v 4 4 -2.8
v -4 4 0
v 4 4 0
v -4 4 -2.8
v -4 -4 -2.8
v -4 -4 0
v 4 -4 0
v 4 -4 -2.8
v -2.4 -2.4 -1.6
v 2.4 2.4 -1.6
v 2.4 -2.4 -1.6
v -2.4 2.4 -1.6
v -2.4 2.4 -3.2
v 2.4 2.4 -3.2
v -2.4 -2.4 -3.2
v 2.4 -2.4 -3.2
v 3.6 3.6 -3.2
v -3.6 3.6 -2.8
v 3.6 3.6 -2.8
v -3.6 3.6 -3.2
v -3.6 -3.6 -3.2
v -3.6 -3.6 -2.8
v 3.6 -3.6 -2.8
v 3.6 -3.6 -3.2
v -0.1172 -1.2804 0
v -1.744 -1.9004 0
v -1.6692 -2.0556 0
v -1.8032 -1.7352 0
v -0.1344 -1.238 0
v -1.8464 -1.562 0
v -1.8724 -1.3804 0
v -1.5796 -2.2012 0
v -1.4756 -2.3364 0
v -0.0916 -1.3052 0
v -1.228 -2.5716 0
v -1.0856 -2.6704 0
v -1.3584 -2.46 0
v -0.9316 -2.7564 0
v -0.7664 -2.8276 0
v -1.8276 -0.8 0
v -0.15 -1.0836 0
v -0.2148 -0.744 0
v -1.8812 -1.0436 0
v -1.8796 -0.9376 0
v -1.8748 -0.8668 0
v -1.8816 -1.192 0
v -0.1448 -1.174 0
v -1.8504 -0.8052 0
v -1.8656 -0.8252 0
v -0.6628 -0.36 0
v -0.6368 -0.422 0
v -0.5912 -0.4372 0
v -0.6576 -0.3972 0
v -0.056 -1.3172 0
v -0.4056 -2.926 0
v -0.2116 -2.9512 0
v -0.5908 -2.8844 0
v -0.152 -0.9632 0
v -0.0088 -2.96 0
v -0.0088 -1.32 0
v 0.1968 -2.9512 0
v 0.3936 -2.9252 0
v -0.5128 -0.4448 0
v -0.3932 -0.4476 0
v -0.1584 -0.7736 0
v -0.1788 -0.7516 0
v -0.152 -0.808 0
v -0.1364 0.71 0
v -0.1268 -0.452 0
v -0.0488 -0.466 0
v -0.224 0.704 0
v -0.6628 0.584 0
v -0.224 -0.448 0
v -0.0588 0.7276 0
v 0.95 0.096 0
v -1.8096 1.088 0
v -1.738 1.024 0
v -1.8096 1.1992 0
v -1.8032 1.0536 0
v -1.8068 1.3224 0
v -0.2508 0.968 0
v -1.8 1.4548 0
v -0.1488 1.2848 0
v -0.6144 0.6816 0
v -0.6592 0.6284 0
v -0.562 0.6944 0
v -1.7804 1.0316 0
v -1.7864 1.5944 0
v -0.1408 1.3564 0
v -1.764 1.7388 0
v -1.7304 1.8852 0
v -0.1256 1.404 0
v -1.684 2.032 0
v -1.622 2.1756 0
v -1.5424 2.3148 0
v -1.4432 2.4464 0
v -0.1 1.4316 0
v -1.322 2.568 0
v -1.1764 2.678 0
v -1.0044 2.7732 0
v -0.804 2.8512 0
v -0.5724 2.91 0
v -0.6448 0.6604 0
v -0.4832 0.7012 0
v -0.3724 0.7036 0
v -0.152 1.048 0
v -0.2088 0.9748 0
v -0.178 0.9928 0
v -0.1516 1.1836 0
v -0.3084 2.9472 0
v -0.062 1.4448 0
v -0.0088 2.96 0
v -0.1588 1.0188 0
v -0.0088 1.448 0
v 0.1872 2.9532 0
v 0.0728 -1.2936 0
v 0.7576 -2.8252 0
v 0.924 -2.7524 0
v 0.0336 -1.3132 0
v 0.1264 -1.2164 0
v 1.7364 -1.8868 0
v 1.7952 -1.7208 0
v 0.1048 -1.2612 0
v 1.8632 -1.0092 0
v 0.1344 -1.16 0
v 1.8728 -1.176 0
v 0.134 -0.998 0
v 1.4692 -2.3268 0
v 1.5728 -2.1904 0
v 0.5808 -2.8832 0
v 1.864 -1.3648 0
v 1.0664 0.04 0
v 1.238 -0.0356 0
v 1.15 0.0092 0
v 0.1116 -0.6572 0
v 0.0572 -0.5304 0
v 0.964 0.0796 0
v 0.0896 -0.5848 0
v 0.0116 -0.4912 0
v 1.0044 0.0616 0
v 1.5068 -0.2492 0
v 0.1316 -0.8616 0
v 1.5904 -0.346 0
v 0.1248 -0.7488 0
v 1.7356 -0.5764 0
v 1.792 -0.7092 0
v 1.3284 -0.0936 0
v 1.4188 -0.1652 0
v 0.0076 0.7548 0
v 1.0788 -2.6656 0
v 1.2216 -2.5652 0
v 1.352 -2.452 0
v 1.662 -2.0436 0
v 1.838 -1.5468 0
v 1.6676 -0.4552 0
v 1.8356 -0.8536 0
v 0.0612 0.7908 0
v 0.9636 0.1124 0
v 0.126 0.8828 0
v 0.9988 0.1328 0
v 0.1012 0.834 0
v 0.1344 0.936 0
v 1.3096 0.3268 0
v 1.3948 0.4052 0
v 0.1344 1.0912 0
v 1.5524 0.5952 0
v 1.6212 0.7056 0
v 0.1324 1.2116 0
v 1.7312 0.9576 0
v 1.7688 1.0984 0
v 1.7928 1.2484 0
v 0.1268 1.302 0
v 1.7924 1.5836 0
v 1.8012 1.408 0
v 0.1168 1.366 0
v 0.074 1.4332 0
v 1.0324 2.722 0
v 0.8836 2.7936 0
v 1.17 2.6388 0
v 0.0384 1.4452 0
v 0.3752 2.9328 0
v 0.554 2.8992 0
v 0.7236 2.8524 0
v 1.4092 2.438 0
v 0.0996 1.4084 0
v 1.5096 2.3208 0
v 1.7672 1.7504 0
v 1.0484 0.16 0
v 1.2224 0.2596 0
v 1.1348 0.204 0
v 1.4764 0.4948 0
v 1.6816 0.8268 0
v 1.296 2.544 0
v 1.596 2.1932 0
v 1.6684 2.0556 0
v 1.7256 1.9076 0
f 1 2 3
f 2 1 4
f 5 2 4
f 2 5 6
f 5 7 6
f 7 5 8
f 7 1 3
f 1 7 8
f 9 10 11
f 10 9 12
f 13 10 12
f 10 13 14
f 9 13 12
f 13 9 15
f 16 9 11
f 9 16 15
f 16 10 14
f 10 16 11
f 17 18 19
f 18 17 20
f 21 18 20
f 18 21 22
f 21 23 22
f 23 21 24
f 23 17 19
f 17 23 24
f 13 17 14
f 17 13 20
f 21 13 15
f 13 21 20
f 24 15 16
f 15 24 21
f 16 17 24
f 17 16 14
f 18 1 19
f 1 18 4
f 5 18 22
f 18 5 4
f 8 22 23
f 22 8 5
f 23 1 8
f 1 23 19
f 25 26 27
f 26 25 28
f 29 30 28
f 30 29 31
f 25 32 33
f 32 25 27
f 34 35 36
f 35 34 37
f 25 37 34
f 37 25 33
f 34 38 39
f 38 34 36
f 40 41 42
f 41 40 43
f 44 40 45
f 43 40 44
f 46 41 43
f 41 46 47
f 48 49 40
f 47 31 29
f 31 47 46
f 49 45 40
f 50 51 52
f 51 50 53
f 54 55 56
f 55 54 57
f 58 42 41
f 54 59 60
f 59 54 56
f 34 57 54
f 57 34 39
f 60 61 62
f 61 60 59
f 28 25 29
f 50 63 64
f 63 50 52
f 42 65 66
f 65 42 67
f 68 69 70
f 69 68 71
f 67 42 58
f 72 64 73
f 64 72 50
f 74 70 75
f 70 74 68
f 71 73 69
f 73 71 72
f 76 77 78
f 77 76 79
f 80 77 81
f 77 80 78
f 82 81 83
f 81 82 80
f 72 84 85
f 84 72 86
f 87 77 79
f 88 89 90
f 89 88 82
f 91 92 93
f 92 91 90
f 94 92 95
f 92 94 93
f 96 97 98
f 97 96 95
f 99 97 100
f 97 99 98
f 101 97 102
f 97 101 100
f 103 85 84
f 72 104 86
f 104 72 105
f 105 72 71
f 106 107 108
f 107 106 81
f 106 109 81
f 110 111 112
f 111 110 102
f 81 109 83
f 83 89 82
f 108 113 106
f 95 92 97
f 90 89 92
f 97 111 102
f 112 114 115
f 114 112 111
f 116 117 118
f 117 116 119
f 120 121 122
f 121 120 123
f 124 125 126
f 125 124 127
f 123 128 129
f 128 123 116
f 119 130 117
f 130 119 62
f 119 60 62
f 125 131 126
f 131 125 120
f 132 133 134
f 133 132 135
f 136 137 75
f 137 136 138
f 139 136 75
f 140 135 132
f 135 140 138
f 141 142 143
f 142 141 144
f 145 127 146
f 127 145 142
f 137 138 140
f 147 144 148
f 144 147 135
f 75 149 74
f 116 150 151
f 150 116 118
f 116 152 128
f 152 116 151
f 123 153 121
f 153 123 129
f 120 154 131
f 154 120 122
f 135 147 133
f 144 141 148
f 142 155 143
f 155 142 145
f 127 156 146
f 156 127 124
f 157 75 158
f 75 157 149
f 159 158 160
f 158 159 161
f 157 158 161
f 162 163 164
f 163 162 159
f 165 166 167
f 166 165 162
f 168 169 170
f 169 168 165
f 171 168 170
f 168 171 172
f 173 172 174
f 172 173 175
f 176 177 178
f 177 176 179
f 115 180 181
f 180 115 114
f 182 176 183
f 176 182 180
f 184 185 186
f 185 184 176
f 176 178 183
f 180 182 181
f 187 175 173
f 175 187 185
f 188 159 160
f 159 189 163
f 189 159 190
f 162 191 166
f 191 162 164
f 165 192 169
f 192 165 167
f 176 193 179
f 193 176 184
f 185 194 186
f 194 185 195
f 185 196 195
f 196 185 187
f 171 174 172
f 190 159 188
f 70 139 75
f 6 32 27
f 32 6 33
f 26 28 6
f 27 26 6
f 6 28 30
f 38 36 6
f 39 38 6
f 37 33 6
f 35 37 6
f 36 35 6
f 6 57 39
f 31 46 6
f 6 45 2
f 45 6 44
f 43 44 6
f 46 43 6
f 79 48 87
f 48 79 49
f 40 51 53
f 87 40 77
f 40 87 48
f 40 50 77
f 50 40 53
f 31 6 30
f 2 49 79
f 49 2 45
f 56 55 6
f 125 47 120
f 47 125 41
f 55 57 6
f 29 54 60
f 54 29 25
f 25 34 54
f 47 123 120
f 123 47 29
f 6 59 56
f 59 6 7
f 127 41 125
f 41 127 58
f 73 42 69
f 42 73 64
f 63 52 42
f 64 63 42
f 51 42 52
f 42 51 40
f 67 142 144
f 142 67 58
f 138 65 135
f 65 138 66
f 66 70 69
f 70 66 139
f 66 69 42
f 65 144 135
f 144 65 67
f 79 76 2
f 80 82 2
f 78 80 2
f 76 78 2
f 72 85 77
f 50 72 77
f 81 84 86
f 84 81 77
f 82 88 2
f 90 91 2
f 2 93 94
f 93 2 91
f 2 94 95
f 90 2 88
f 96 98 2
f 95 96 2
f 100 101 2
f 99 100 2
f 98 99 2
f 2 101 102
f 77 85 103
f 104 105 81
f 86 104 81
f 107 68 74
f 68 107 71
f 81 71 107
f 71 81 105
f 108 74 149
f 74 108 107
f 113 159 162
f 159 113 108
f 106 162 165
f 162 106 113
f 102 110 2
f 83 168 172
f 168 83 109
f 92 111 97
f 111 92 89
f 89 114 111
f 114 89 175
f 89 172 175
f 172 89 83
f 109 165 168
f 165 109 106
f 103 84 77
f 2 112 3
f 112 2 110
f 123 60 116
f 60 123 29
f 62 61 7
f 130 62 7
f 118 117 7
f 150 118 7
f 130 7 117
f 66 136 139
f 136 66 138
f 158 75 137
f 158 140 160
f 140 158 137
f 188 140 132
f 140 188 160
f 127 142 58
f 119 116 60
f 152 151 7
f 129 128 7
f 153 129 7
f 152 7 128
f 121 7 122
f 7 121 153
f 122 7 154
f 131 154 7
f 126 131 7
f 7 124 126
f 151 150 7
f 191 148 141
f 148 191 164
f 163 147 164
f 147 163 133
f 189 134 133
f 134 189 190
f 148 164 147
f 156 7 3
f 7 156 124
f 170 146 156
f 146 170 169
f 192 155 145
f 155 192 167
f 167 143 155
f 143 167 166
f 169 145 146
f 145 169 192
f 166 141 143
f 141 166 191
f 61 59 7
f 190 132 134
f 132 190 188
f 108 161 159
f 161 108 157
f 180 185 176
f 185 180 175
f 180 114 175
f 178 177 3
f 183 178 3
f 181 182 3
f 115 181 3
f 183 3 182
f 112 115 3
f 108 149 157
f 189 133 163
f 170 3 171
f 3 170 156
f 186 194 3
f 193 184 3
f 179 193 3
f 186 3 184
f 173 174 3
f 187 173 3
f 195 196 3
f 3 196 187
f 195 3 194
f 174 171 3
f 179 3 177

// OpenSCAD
// file: ../p/box5.scad
use <../lib.scad>
function ldraw_lib__box5() = [
// 0 Box with 5 Faces and All Edges
// 0 Name: box5.dat
// 0 Author: James Jessiman
// 0 !LDRAW_ORG Primitive UPDATE 2012-01
// 0 !LICENSE Licensed under CC BY 4.0 : see CAreadme.txt
// 
// 0 BFC CERTIFY CCW
  [0,"BFC","CERTIFY"],
  [0,"BFC","CCW"],
// 
// 0 !HISTORY 2002-04-03 [sbliss] Modified for BFC compliance
// 0 !HISTORY 2002-04-25 [PTadmin] Official Update 2002-02
// 0 !HISTORY 2007-06-24 [PTadmin] Header formatted for Contributor Agreement
// 0 !HISTORY 2008-07-01 [PTadmin] Official Update 2008-01
// 0 !HISTORY 2012-02-16 [Philo] Changed to CCW
// 0 !HISTORY 2012-03-30 [PTadmin] Official Update 2012-01
// 
// 
// 2 24 1 1 1 -1 1 1
  [2,24,1,1,1,-1,1,1],
// 2 24 -1 1 1 -1 1 -1
  [2,24,-1,1,1,-1,1,-1],
// 2 24 -1 1 -1 1 1 -1
  [2,24,-1,1,-1,1,1,-1],
// 2 24 1 1 -1 1 1 1
  [2,24,1,1,-1,1,1,1],
// 2 24 1 0 1 -1 0 1
  [2,24,1,0,1,-1,0,1],
// 2 24 -1 0 1 -1 0 -1
  [2,24,-1,0,1,-1,0,-1],
// 2 24 -1 0 -1 1 0 -1
  [2,24,-1,0,-1,1,0,-1],
// 2 24 1 0 -1 1 0 1
  [2,24,1,0,-1,1,0,1],
// 2 24 1 0 1 1 1 1
  [2,24,1,0,1,1,1,1],
// 2 24 -1 0 1 -1 1 1
  [2,24,-1,0,1,-1,1,1],
// 2 24 1 0 -1 1 1 -1
  [2,24,1,0,-1,1,1,-1],
// 2 24 -1 0 -1 -1 1 -1
  [2,24,-1,0,-1,-1,1,-1],
// 4 16 -1 1 1 1 1 1 1 1 -1 -1 1 -1
  [4,16,-1,1,1,1,1,1,1,1,-1,-1,1,-1],
// 4 16 -1 1 1 -1 0 1 1 0 1 1 1 1
  [4,16,-1,1,1,-1,0,1,1,0,1,1,1,1],
// 4 16 -1 1 -1 -1 0 -1 -1 0 1 -1 1 1
  [4,16,-1,1,-1,-1,0,-1,-1,0,1,-1,1,1],
// 4 16 1 1 -1 1 0 -1 -1 0 -1 -1 1 -1
  [4,16,1,1,-1,1,0,-1,-1,0,-1,-1,1,-1],
// 4 16 1 1 1 1 0 1 1 0 -1 1 1 -1
  [4,16,1,1,1,1,0,1,1,0,-1,1,1,-1],
];
module ldraw_lib__box5(step=0, col=false, unit=2/5, alt=false, line=0.2, solid=!$preview)
    makepoly(ldraw_lib__box5(), step=step, col=col, unit=unit, alt=alt, line=line, solid=solid);
ldraw_lib__box5(line=0.2);
// file: ../p/box4.scad
use <../lib.scad>
function ldraw_lib__box4() = [
// 0 Box with 4 Faces (2 Parallel Pairs) and All Edges
// 0 Name: box4.dat
// 0 Author: James Jessiman
// 0 !LDRAW_ORG Primitive UPDATE 2012-01
// 0 !LICENSE Licensed under CC BY 4.0 : see CAreadme.txt
// 
// 0 BFC CERTIFY CCW
  [0,"BFC","CERTIFY"],
  [0,"BFC","CCW"],
// 
// 0 !HISTORY 2002-04-03 [sbliss] Modified for BFC compliance
// 0 !HISTORY 2002-04-25 [PTadmin] Official Update 2002-02
// 0 !HISTORY 2007-06-24 [PTadmin] Header formatted for Contributor Agreement
// 0 !HISTORY 2008-07-01 [PTadmin] Official Update 2008-01
// 0 !HISTORY 2012-02-16 [Philo] Changed to CCW
// 0 !HISTORY 2012-03-30 [PTadmin] Official Update 2012-01
// 
// 
// 2 24 1 1 1 -1 1 1
  [2,24,1,1,1,-1,1,1],
// 2 24 -1 1 1 -1 1 -1
  [2,24,-1,1,1,-1,1,-1],
// 2 24 -1 1 -1 1 1 -1
  [2,24,-1,1,-1,1,1,-1],
// 2 24 1 1 -1 1 1 1
  [2,24,1,1,-1,1,1,1],
// 2 24 1 0 1 -1 0 1
  [2,24,1,0,1,-1,0,1],
// 2 24 -1 0 1 -1 0 -1
  [2,24,-1,0,1,-1,0,-1],
// 2 24 -1 0 -1 1 0 -1
  [2,24,-1,0,-1,1,0,-1],
// 2 24 1 0 -1 1 0 1
  [2,24,1,0,-1,1,0,1],
// 2 24 1 0 1 1 1 1
  [2,24,1,0,1,1,1,1],
// 2 24 -1 0 1 -1 1 1
  [2,24,-1,0,1,-1,1,1],
// 2 24 1 0 -1 1 1 -1
  [2,24,1,0,-1,1,1,-1],
// 2 24 -1 0 -1 -1 1 -1
  [2,24,-1,0,-1,-1,1,-1],
// 4 16 -1 1 1 -1 0 1 1 0 1 1 1 1
  [4,16,-1,1,1,-1,0,1,1,0,1,1,1,1],
// 4 16 -1 1 -1 -1 0 -1 -1 0 1 -1 1 1
  [4,16,-1,1,-1,-1,0,-1,-1,0,1,-1,1,1],
// 4 16 1 1 -1 1 0 -1 -1 0 -1 -1 1 -1
  [4,16,1,1,-1,1,0,-1,-1,0,-1,-1,1,-1],
// 4 16 1 1 1 1 0 1 1 0 -1 1 1 -1
  [4,16,1,1,1,1,0,1,1,0,-1,1,1,-1],
];
module ldraw_lib__box4(step=0, col=false, unit=2/5, alt=false, line=0.2, solid=!$preview)
    makepoly(ldraw_lib__box4(), step=step, col=col, unit=unit, alt=alt, line=line, solid=solid);
ldraw_lib__box4(line=0.2);
// file: s/3070bs01.scad
use <../../lib.scad>
use <../../p/box4.scad>
use <../../p/box5.scad>
function ldraw_lib__s__3070bs01() = [
// 0 ~Tile  1 x  1 with Groove without Top Face
// 0 Name: s\3070bs01.dat
// 0 Author: Chris Dee [cwdee]
// 0 !LDRAW_ORG Subpart UPDATE 2009-02
// 0 !LICENSE Licensed under CC BY 4.0 : see CAreadme.txt
// 
// 0 BFC CERTIFY CCW
  [0,"BFC","CERTIFY"],
  [0,"BFC","CCW"],
// 
// 0 !HISTORY 2009-09-03 [PTadmin] Official Update 2009-02
// 
// 
// 1 16 0 0 0 10 0 0 0 7 0 0 0 10 box4.dat
  [1,16,0,0,0,10,0,0,0,7,0,0,0,10, ldraw_lib__box4()],
// 0 BFC INVERTNEXT
  [0,"BFC","INVERTNEXT"],
// 1 16 0 8 0 6 0 0 0 -4 0 0 0 6 box5.dat
  [1,16,0,8,0,6,0,0,0,-4,0,0,0,6, ldraw_lib__box5()],
// 1 16 0 7 0 9 0 0 0 1 0 0 0 9 box4.dat
  [1,16,0,7,0,9,0,0,0,1,0,0,0,9, ldraw_lib__box4()],
// 
// 4 16 9 8 9 6 8 6 -6 8 6 -9 8 9
  [4,16,9,8,9,6,8,6,-6,8,6,-9,8,9],
// 4 16 -9 8 9 -6 8 6 -6 8 -6 -9 8 -9
  [4,16,-9,8,9,-6,8,6,-6,8,-6,-9,8,-9],
// 4 16 -9 8 -9 -6 8 -6 6 8 -6 9 8 -9
  [4,16,-9,8,-9,-6,8,-6,6,8,-6,9,8,-9],
// 4 16 9 8 -9 6 8 -6 6 8 6 9 8 9
  [4,16,9,8,-9,6,8,-6,6,8,6,9,8,9],
// 
// 4 16 10 7 10 9 7 9 -9 7 9 -10 7 10
  [4,16,10,7,10,9,7,9,-9,7,9,-10,7,10],
// 4 16 -10 7 10 -9 7 9 -9 7 -9 -10 7 -10
  [4,16,-10,7,10,-9,7,9,-9,7,-9,-10,7,-10],
// 4 16 -10 7 -10 -9 7 -9 9 7 -9 10 7 -10
  [4,16,-10,7,-10,-9,7,-9,9,7,-9,10,7,-10],
// 4 16 10 7 -10 9 7 -9 9 7 9 10 7 10
  [4,16,10,7,-10,9,7,-9,9,7,9,10,7,10],
// 0
];
module ldraw_lib__s__3070bs01(step=0, col=false, unit=2/5, alt=false, line=0.2, solid=!$preview)
    makepoly(ldraw_lib__s__3070bs01(), step=step, col=col, unit=unit, alt=alt, line=line, solid=solid);
ldraw_lib__s__3070bs01(line=0.2);
// main file
use <../lib.scad>
use <s/3070bs01.scad>
function ldraw_lib__3070bp08() = [
// 0 Tile  1 x  1 with Black Bold "3" Pattern
// 0 Name: 3070bp08.dat
// 0 Author: John Riley [jriley]
// 0 !LDRAW_ORG Part UPDATE 2009-03
// 0 !LICENSE Licensed under CC BY 4.0 : see CAreadme.txt
// 
// 0 BFC CERTIFY CCW
  [0,"BFC","CERTIFY"],
  [0,"BFC","CCW"],
// 
// 0 !KEYWORDS thick
// 
// 0 !HISTORY 2003-07-02 [Steffen] fixed BFC errors
// 0 !HISTORY 2004-09-15 [PTadmin] Official Update 2004-03
// 0 !HISTORY 2007-10-13 [PTadmin] Header formatted for Contributor Agreement
// 0 !HISTORY 2008-07-01 [PTadmin] Official Update 2008-01
// 0 !HISTORY 2009-08-12 [anathema] Corrected pattern
// 0 !HISTORY 2009-12-29 [PTadmin] Official Update 2009-03
// 
// 
// 1 16 0 0 0 1 0 0 0 1 0 0 0 1 s\3070bs01.dat
  [1,16,0,0,0,1,0,0,0,1,0,0,0,1, ldraw_lib__s__3070bs01()],
// 4 0 -4.36 0 -4.751 -4.173 0 -5.139 -0.293 0 -3.201 -4.508 0 -4.338
  [4,0,-4.36,0,-4.751,-4.173,0,-5.139,-0.293,0,-3.201,-4.508,0,-4.338],
// 4 0 -4.616 0 -3.905 -4.508 0 -4.338 -0.336 0 -3.095 -4.681 0 -3.451
  [4,0,-4.616,0,-3.905,-4.508,0,-4.338,-0.336,0,-3.095,-4.681,0,-3.451],
// 4 0 -0.293 0 -3.201 -4.173 0 -5.139 -3.949 0 -5.503 -3.689 0 -5.841
  [4,0,-0.293,0,-3.201,-4.173,0,-5.139,-3.949,0,-5.503,-3.689,0,-5.841],
// 4 0 -3.07 0 -6.429 -2.714 0 -6.676 -0.229 0 -3.263 -3.396 0 -6.15
  [4,0,-3.07,0,-6.429,-2.714,0,-6.676,-0.229,0,-3.263,-3.396,0,-6.15],
// 4 0 -3.689 0 -5.841 -3.396 0 -6.15 -0.229 0 -3.263 -0.293 0 -3.201
  [4,0,-3.689,0,-5.841,-3.396,0,-6.15,-0.229,0,-3.263,-0.293,0,-3.201],
// 4 0 -0.229 0 -3.263 -2.714 0 -6.676 -2.329 0 -6.891 -1.916 0 -7.069
  [4,0,-0.229,0,-3.263,-2.714,0,-6.676,-2.329,0,-6.891,-1.916,0,-7.069],
// 4 0 -0.375 0 -2.709 -0.537 0 -1.86 -4.569 0 -2 -4.703 0 -2.609
  [4,0,-0.375,0,-2.709,-0.537,0,-1.86,-4.569,0,-2,-4.703,0,-2.609],
// 3 0 -4.699 0 -2.344 -4.569 0 -2 -4.687 0 -2.167
  [3,0,-4.699,0,-2.344,-4.569,0,-2,-4.687,0,-2.167],
// 3 0 -4.703 0 -2.609 -4.569 0 -2 -4.699 0 -2.344
  [3,0,-4.703,0,-2.609,-4.569,0,-2,-4.699,0,-2.344],
// 4 0 -0.375 0 -2.709 -4.703 0 -2.609 -4.704 0 -2.98 -0.362 0 -2.935
  [4,0,-0.375,0,-2.709,-4.703,0,-2.609,-4.704,0,-2.98,-0.362,0,-2.935],
// 3 0 -4.626 0 -2.013 -4.664 0 -2.063 -4.569 0 -2
  [3,0,-4.626,0,-2.013,-4.664,0,-2.063,-4.569,0,-2],
// 4 0 -0.362 0 -2.935 -4.704 0 -2.98 -4.681 0 -3.451 -0.336 0 -3.095
  [4,0,-0.362,0,-2.935,-4.704,0,-2.98,-4.681,0,-3.451,-0.336,0,-3.095],
// 3 0 -4.664 0 -2.063 -4.687 0 -2.167 -4.569 0 -2
  [3,0,-4.664,0,-2.063,-4.687,0,-2.167,-4.569,0,-2],
// 4 0 -1.657 0 -0.9 -1.644 0 -0.993 -1.592 0 -1.055 -1.478 0 -1.093
  [4,0,-1.657,0,-0.9,-1.644,0,-0.993,-1.592,0,-1.055,-1.478,0,-1.093],
// 4 0 -0.14 0 -3.293 -1.477 0 -7.211 -1.014 0 -7.315 -0.529 0 -7.378
  [4,0,-0.14,0,-3.293,-1.477,0,-7.211,-1.014,0,-7.315,-0.529,0,-7.378],
// 3 0 -0.38 0 -2.408 -0.537 0 -1.86 -0.375 0 -2.709
  [3,0,-0.38,0,-2.408,-0.537,0,-1.86,-0.375,0,-2.709],
// 4 0 -0.022 0 -3.3 -0.14 0 -3.293 -0.529 0 -7.378 -0.022 0 -7.4
  [4,0,-0.022,0,-3.3,-0.14,0,-3.293,-0.529,0,-7.378,-0.022,0,-7.4],
// 4 0 -0.14 0 -3.293 -0.229 0 -3.263 -1.916 0 -7.069 -1.477 0 -7.211
  [4,0,-0.14,0,-3.293,-0.229,0,-3.263,-1.916,0,-7.069,-1.477,0,-7.211],
// 4 0 -0.022 0 -3.3 -0.022 0 -7.4 0.492 0 -7.378 0.984 0 -7.313
  [4,0,-0.022,0,-3.3,-0.022,0,-7.4,0.492,0,-7.378,0.984,0,-7.313],
// 3 0 -4.508 0 -4.338 -0.293 0 -3.201 -0.336 0 -3.095
  [3,0,-4.508,0,-4.338,-0.293,0,-3.201,-0.336,0,-3.095],
// 4 0 -1.657 0 -0.9 -1.478 0 -1.093 -1.282 0 -1.112 -0.983 0 -1.119
  [4,0,-1.657,0,-0.9,-1.478,0,-1.093,-1.282,0,-1.112,-0.983,0,-1.119],
// 4 0 -0.537 0 -1.86 -0.38 0 -2.02 -0.396 0 -1.934 -0.447 0 -1.879
  [4,0,-0.537,0,-1.86,-0.38,0,-2.02,-0.396,0,-1.934,-0.447,0,-1.879],
// 4 0 -0.317 0 -1.13 -0.122 0 -1.165 -0.341 0 1.775 -0.56 0 1.76
  [4,0,-0.317,0,-1.13,-0.122,0,-1.165,-0.341,0,1.775,-0.56,0,1.76],
// 3 0 -0.38 0 -2.02 -0.537 0 -1.86 -0.38 0 -2.408
  [3,0,-0.38,0,-2.02,-0.537,0,-1.86,-0.38,0,-2.408],
// 4 0 -0.983 0 -1.119 -0.56 0 -1.12 -1.657 0 1.46 -1.657 0 -0.9
  [4,0,-0.983,0,-1.119,-0.56,0,-1.12,-1.657,0,1.46,-1.657,0,-0.9],
// 4 0 -0.122 0 -1.165 2.375 0 0.24 -0.147 0 1.819 -0.341 0 1.775
  [4,0,-0.122,0,-1.165,2.375,0,0.24,-0.147,0,1.819,-0.341,0,1.775],
// 4 0 -0.56 0 -1.12 -0.317 0 -1.13 -0.56 0 1.76 -1.657 0 1.46
  [4,0,-0.56,0,-1.12,-0.317,0,-1.13,-0.56,0,1.76,-1.657,0,1.46],
// 4 0 -4.345 0 2.56 -4.524 0 2.998 -4.524 0 2.72 -4.508 0 2.634
  [4,0,-4.345,0,2.56,-4.524,0,2.998,-4.524,0,2.72,-4.508,0,2.634],
// 4 0 -4.517 0 3.306 -4.524 0 2.998 -4.345 0 2.56 -0.627 0 2.42
  [4,0,-4.517,0,3.306,-4.524,0,2.998,-4.345,0,2.56,-0.627,0,2.42],
// 4 0 -0.372 0 3.212 -4.5 0 3.637 -4.517 0 3.306 -0.627 0 2.42
  [4,0,-0.372,0,3.212,-4.5,0,3.637,-4.517,0,3.306,-0.627,0,2.42],
// 4 0 -1.648 0 1.571 -1.657 0 1.46 -1.405 0 1.736 -1.536 0 1.704
  [4,0,-1.648,0,1.571,-1.657,0,1.46,-1.405,0,1.736,-1.536,0,1.704],
// 3 0 -4.451 0 2.579 -4.345 0 2.56 -4.508 0 2.634
  [3,0,-4.451,0,2.579,-4.345,0,2.56,-4.508,0,2.634],
// 4 0 -4.466 0 3.986 -4.5 0 3.637 -0.352 0 3.391 -4.41 0 4.347
  [4,0,-4.466,0,3.986,-4.5,0,3.637,-0.352,0,3.391,-4.41,0,4.347],
// 4 0 -4.326 0 4.713 -4.41 0 4.347 -0.314 0 3.51 -4.21 0 5.08
  [4,0,-4.326,0,4.713,-4.41,0,4.347,-0.314,0,3.51,-4.21,0,5.08],
// 4 0 -4.055 0 5.439 -4.21 0 5.08 -0.314 0 3.51 -3.856 0 5.787
  [4,0,-4.055,0,5.439,-4.21,0,5.08,-0.314,0,3.51,-3.856,0,5.787],
// 4 0 -0.25 0 3.579 -3.305 0 6.42 -3.608 0 6.116 -3.856 0 5.787
  [4,0,-0.25,0,3.579,-3.305,0,6.42,-3.608,0,6.116,-3.856,0,5.787],
// 4 0 -2.941 0 6.695 -3.305 0 6.42 -0.25 0 3.579 -2.511 0 6.933
  [4,0,-2.941,0,6.695,-3.305,0,6.42,-0.25,0,3.579,-2.511,0,6.933],
// 4 0 -2.01 0 7.128 -2.511 0 6.933 -0.25 0 3.579 -1.431 0 7.275
  [4,0,-2.01,0,7.128,-2.511,0,6.933,-0.25,0,3.579,-1.431,0,7.275],
// 3 0 -1.612 0 1.651 -1.648 0 1.571 -1.536 0 1.704
  [3,0,-1.612,0,1.651,-1.648,0,1.571,-1.536,0,1.704],
// 4 0 -1.208 0 1.753 -1.405 0 1.736 -1.657 0 1.46 -0.931 0 1.759
  [4,0,-1.208,0,1.753,-1.405,0,1.736,-1.657,0,1.46,-0.931,0,1.759],
// 3 0 -0.931 0 1.759 -1.657 0 1.46 -0.56 0 1.76
  [3,0,-0.931,0,1.759,-1.657,0,1.46,-0.56,0,1.76],
// 4 0 -0.38 0 2.62 -0.627 0 2.42 -0.522 0 2.437 -0.445 0 2.482
  [4,0,-0.38,0,2.62,-0.627,0,2.42,-0.522,0,2.437,-0.445,0,2.482],
// 3 0 -0.38 0 2.62 -0.379 0 2.959 -0.627 0 2.42
  [3,0,-0.38,0,2.62,-0.379,0,2.959,-0.627,0,2.42],
// 4 0 -0.771 0 7.368 -1.431 0 7.275 -0.155 0 3.612 -0.022 0 7.4
  [4,0,-0.771,0,7.368,-1.431,0,7.275,-0.155,0,3.612,-0.022,0,7.4],
// 3 0 -0.627 0 2.42 -0.379 0 2.959 -0.372 0 3.212
  [3,0,-0.627,0,2.42,-0.379,0,2.959,-0.372,0,3.212],
// 3 0 -0.372 0 3.212 -0.352 0 3.391 -4.5 0 3.637
  [3,0,-0.372,0,3.212,-0.352,0,3.391,-4.5,0,3.637],
// 3 0 -0.445 0 2.482 -0.397 0 2.547 -0.38 0 2.62
  [3,0,-0.445,0,2.482,-0.397,0,2.547,-0.38,0,2.62],
// 3 0 -3.856 0 5.787 -0.314 0 3.51 -0.25 0 3.579
  [3,0,-3.856,0,5.787,-0.314,0,3.51,-0.25,0,3.579],
// 3 0 -4.41 0 4.347 -0.352 0 3.391 -0.314 0 3.51
  [3,0,-4.41,0,4.347,-0.352,0,3.391,-0.314,0,3.51],
// 3 0 -0.25 0 3.579 -0.155 0 3.612 -1.431 0 7.275
  [3,0,-0.25,0,3.579,-0.155,0,3.612,-1.431,0,7.275],
// 4 0 -0.022 0 7.4 -0.155 0 3.612 -0.022 0 3.62 0.468 0 7.383
  [4,0,-0.022,0,7.4,-0.155,0,3.612,-0.022,0,3.62,0.468,0,7.383],
// 4 0 2.31 0 -6.881 0.182 0 -3.234 0.084 0 -3.283 1.894 0 -7.063
  [4,0,2.31,0,-6.881,0.182,0,-3.234,0.084,0,-3.283,1.894,0,-7.063],
// 4 0 4.488 0 -4.302 0.316 0 -3.041 0.262 0 -3.153 4.341 0 -4.717
  [4,0,4.488,0,-4.302,0.316,0,-3.041,0.262,0,-3.153,4.341,0,-4.717],
// 4 0 4.658 0 -2.523 0.335 0 -2.495 0.336 0 -2.9 4.682 0 -2.94
  [4,0,4.658,0,-2.523,0.335,0,-2.495,0.336,0,-2.9,4.682,0,-2.94],
// 4 0 0.262 0 -3.153 0.182 0 -3.234 3.673 0 -5.817 3.932 0 -5.476
  [4,0,0.262,0,-3.153,0.182,0,-3.234,3.673,0,-5.817,3.932,0,-5.476],
// 4 0 0.084 0 -3.283 0.984 0 -7.313 1.452 0 -7.208 1.894 0 -7.063
  [4,0,0.084,0,-3.283,0.984,0,-7.313,1.452,0,-7.208,1.894,0,-7.063],
// 3 0 0.084 0 -3.283 -0.022 0 -3.3 0.984 0 -7.313
  [3,0,0.084,0,-3.283,-0.022,0,-3.3,0.984,0,-7.313],
// 4 0 0.336 0 -2.9 0.316 0 -3.041 4.66 0 -3.412 4.682 0 -2.94
  [4,0,0.336,0,-2.9,0.316,0,-3.041,4.66,0,-3.412,4.682,0,-2.94],
// 4 0 2.875 0 0.023 2.666 0 0.1 0.279 0 -1.643 3.095 0 -0.089
  [4,0,2.875,0,0.023,2.666,0,0.1,0.279,0,-1.643,3.095,0,-0.089],
// 4 0 0.143 0 -1.326 0.224 0 -1.462 2.41 0 0.199 2.375 0 0.24
  [4,0,0.143,0,-1.326,0.224,0,-1.462,2.41,0,0.199,2.375,0,0.24],
// 3 0 0.029 0 -1.228 0.143 0 -1.326 2.375 0 0.24
  [3,0,0.029,0,-1.228,0.143,0,-1.326,2.375,0,0.24],
// 4 0 2.511 0 0.154 0.224 0 -1.462 0.279 0 -1.643 2.666 0 0.1
  [4,0,2.511,0,0.154,0.224,0,-1.462,0.279,0,-1.643,2.666,0,0.1],
// 4 0 0.312 0 -1.872 0.329 0 -2.154 3.976 0 -0.865 3.767 0 -0.623
  [4,0,0.312,0,-1.872,0.329,0,-2.154,3.976,0,-0.865,3.767,0,-0.623],
// 4 0 0.329 0 -2.154 0.335 0 -2.495 4.48 0 -1.773 4.339 0 -1.441
  [4,0,0.329,0,-2.154,0.335,0,-2.495,4.48,0,-1.773,4.339,0,-1.441],
// 3 0 2.41 0 0.199 0.224 0 -1.462 2.511 0 0.154
  [3,0,2.41,0,0.199,0.224,0,-1.462,2.511,0,0.154],
// 4 0 3.321 0 -0.234 0.279 0 -1.643 0.312 0 -1.872 3.547 0 -0.413
  [4,0,3.321,0,-0.234,0.279,0,-1.643,0.312,0,-1.872,3.547,0,-0.413],
// 3 0 2.375 0 0.24 0.019 0 1.887 -0.147 0 1.819
  [3,0,2.375,0,0.24,0.019,0,1.887,-0.147,0,1.819],
// 4 0 0.182 0 -3.234 2.31 0 -6.881 2.697 0 -6.664 3.054 0 -6.413
  [4,0,0.182,0,-3.234,2.31,0,-6.881,2.697,0,-6.664,3.054,0,-6.413],
// 4 0 0.182 0 -3.234 3.054 0 -6.413 3.38 0 -6.13 3.673 0 -5.817
  [4,0,0.182,0,-3.234,3.054,0,-6.413,3.38,0,-6.13,3.673,0,-5.817],
// 4 0 0.262 0 -3.153 3.932 0 -5.476 4.155 0 -5.109 4.341 0 -4.717
  [4,0,0.262,0,-3.153,3.932,0,-5.476,4.155,0,-5.109,4.341,0,-4.717],
// 4 0 0.316 0 -3.041 4.488 0 -4.302 4.595 0 -3.867 4.66 0 -3.412
  [4,0,0.316,0,-3.041,4.488,0,-4.302,4.595,0,-3.867,4.66,0,-3.412],
// 3 0 0.279 0 -1.643 3.321 0 -0.234 3.095 0 -0.089
  [3,0,0.279,0,-1.643,3.321,0,-0.234,3.095,0,-0.089],
// 3 0 0.312 0 -1.872 3.767 0 -0.623 3.547 0 -0.413
  [3,0,0.312,0,-1.872,3.767,0,-0.623,3.547,0,-0.413],
// 4 0 0.329 0 -2.154 4.339 0 -1.441 4.169 0 -1.138 3.976 0 -0.865
  [4,0,0.329,0,-2.154,4.339,0,-1.441,4.169,0,-1.138,3.976,0,-0.865],
// 4 0 4.589 0 -2.134 4.48 0 -1.773 0.335 0 -2.495 4.658 0 -2.523
  [4,0,4.589,0,-2.134,4.48,0,-1.773,0.335,0,-2.495,4.658,0,-2.523],
// 4 0 0.153 0 1.977 0.019 0 1.887 2.375 0 0.24 2.409 0 0.281
  [4,0,0.153,0,1.977,0.019,0,1.887,2.375,0,0.24,2.409,0,0.281],
// 4 0 2.497 0 0.332 0.315 0 2.207 0.253 0 2.085 2.409 0 0.281
  [4,0,2.497,0,0.332,0.315,0,2.207,0.253,0,2.085,2.409,0,0.281],
// 3 0 0.153 0 1.977 2.409 0 0.281 0.253 0 2.085
  [3,0,0.153,0,1.977,2.409,0,0.281,0.253,0,2.085],
// 4 0 3.487 0 1.013 0.336 0 2.34 0.315 0 2.207 3.274 0 0.817
  [4,0,3.487,0,1.013,0.336,0,2.34,0.315,0,2.207,3.274,0,0.817],
// 4 0 4.053 0 1.764 0.336 0 2.728 0.336 0 2.34 3.881 0 1.488
  [4,0,4.053,0,1.764,0.336,0,2.728,0.336,0,2.34,3.881,0,1.488],
// 4 0 0.331 0 3.029 0.336 0 2.728 4.328 0 2.394 4.422 0 2.746
  [4,0,0.331,0,3.029,0.336,0,2.728,4.328,0,2.394,4.422,0,2.746],
// 4 0 4.482 0 3.121 0.317 0 3.255 0.331 0 3.029 4.422 0 2.746
  [4,0,4.482,0,3.121,0.317,0,3.255,0.331,0,3.029,4.422,0,2.746],
// 4 0 0.292 0 3.415 0.317 0 3.255 4.503 0 3.52 4.481 0 3.959
  [4,0,0.292,0,3.415,0.317,0,3.255,4.503,0,3.52,4.481,0,3.959],
// 4 0 0.185 0 3.583 2.925 0 6.597 2.581 0 6.805 2.209 0 6.984
  [4,0,0.185,0,3.583,2.925,0,6.597,2.581,0,6.805,2.209,0,6.984],
// 4 0 0.468 0 7.383 -0.022 0 3.62 0.096 0 3.613 0.938 0 7.332
  [4,0,0.468,0,7.383,-0.022,0,3.62,0.096,0,3.613,0.938,0,7.332],
// 4 0 1.385 0 7.248 0.096 0 3.613 0.185 0 3.583 1.809 0 7.131
  [4,0,1.385,0,7.248,0.096,0,3.613,0.185,0,3.583,1.809,0,7.131],
// 4 0 3.523 0 6.095 0.185 0 3.583 0.249 0 3.521 3.774 0 5.802
  [4,0,3.523,0,6.095,0.185,0,3.583,0.249,0,3.521,3.774,0,5.802],
// 3 0 0.185 0 3.583 2.209 0 6.984 1.809 0 7.131
  [3,0,0.185,0,3.583,2.209,0,6.984,1.809,0,7.131],
// 3 0 0.096 0 3.613 1.385 0 7.248 0.938 0 7.332
  [3,0,0.096,0,3.613,1.385,0,7.248,0.938,0,7.332],
// 4 0 4.418 0 4.376 0.249 0 3.521 0.292 0 3.415 4.481 0 3.959
  [4,0,4.418,0,4.376,0.249,0,3.521,0.292,0,3.415,4.481,0,3.959],
// 3 0 2.621 0 0.4 0.315 0 2.207 2.497 0 0.332
  [3,0,2.621,0,0.4,0.315,0,2.207,2.497,0,0.332],
// 4 0 0.315 0 2.207 2.837 0 0.51 3.056 0 0.649 3.274 0 0.817
  [4,0,0.315,0,2.207,2.837,0,0.51,3.056,0,0.649,3.274,0,0.817],
// 4 0 0.336 0 2.34 3.487 0 1.013 3.691 0 1.237 3.881 0 1.488
  [4,0,0.336,0,2.34,3.487,0,1.013,3.691,0,1.237,3.881,0,1.488],
// 4 0 0.336 0 2.728 4.053 0 1.764 4.204 0 2.067 4.328 0 2.394
  [4,0,0.336,0,2.728,4.053,0,1.764,4.204,0,2.067,4.328,0,2.394],
// 4 0 3.24 0 6.36 2.925 0 6.597 0.185 0 3.583 3.523 0 6.095
  [4,0,3.24,0,6.36,2.925,0,6.597,0.185,0,3.583,3.523,0,6.095],
// 4 0 3.99 0 5.483 3.774 0 5.802 0.249 0 3.521 4.171 0 5.139
  [4,0,3.99,0,5.483,3.774,0,5.802,0.249,0,3.521,4.171,0,5.139],
// 4 0 0.249 0 3.521 4.418 0 4.376 4.314 0 4.769 4.171 0 5.139
  [4,0,0.249,0,3.521,4.418,0,4.376,4.314,0,4.769,4.171,0,5.139],
// 3 0 4.482 0 3.121 4.503 0 3.52 0.317 0 3.255
  [3,0,4.482,0,3.121,4.503,0,3.52,0.317,0,3.255],
// 3 0 2.837 0 0.51 0.315 0 2.207 2.621 0 0.4
  [3,0,2.837,0,0.51,0.315,0,2.207,2.621,0,0.4],
// 3 0 -0.122 0 -1.165 0.029 0 -1.228 2.375 0 0.24
  [3,0,-0.122,0,-1.165,0.029,0,-1.228,2.375,0,0.24],
// 3 16 -10 0 -10 -3.949 0 -5.503 -4.173 0 -5.139
  [3,16,-10,0,-10,-3.949,0,-5.503,-4.173,0,-5.139],
// 3 16 -3.949 0 -5.503 -10 0 -10 -3.689 0 -5.841
  [3,16,-3.949,0,-5.503,-10,0,-10,-3.689,0,-5.841],
// 3 16 -4.36 0 -4.751 -4.508 0 -4.338 -10 0 -10
  [3,16,-4.36,0,-4.751,-4.508,0,-4.338,-10,0,-10],
// 3 16 -4.173 0 -5.139 -4.36 0 -4.751 -10 0 -10
  [3,16,-4.173,0,-5.139,-4.36,0,-4.751,-10,0,-10],
// 3 16 -10 0 -10 -4.508 0 -4.338 -4.616 0 -3.905
  [3,16,-10,0,-10,-4.508,0,-4.338,-4.616,0,-3.905],
// 3 16 -2.329 0 -6.891 -2.714 0 -6.676 -10 0 -10
  [3,16,-2.329,0,-6.891,-2.714,0,-6.676,-10,0,-10],
// 3 16 -1.916 0 -7.069 -2.329 0 -6.891 -10 0 -10
  [3,16,-1.916,0,-7.069,-2.329,0,-6.891,-10,0,-10],
// 3 16 -3.396 0 -6.15 -3.689 0 -5.841 -10 0 -10
  [3,16,-3.396,0,-6.15,-3.689,0,-5.841,-10,0,-10],
// 3 16 -3.07 0 -6.429 -3.396 0 -6.15 -10 0 -10
  [3,16,-3.07,0,-6.429,-3.396,0,-6.15,-10,0,-10],
// 3 16 -2.714 0 -6.676 -3.07 0 -6.429 -10 0 -10
  [3,16,-2.714,0,-6.676,-3.07,0,-6.429,-10,0,-10],
// 3 16 -10 0 -10 -1.477 0 -7.211 -1.916 0 -7.069
  [3,16,-10,0,-10,-1.477,0,-7.211,-1.916,0,-7.069],
// 3 16 -4.681 0 -3.451 -4.704 0 -2.98 -10 0 -10
  [3,16,-4.681,0,-3.451,-4.704,0,-2.98,-10,0,-10],
// 4 16 -10 0 -10 -4.699 0 -2.344 -4.687 0 -2.167 -10 0 10
  [4,16,-10,0,-10,-4.699,0,-2.344,-4.687,0,-2.167,-10,0,10],
// 3 16 -4.703 0 -2.609 -4.699 0 -2.344 -10 0 -10
  [3,16,-4.703,0,-2.609,-4.699,0,-2.344,-10,0,-10],
// 3 16 -4.704 0 -2.98 -4.703 0 -2.609 -10 0 -10
  [3,16,-4.704,0,-2.98,-4.703,0,-2.609,-10,0,-10],
// 4 16 -4.508 0 2.634 -4.664 0 -2.063 -4.626 0 -2.013 -4.451 0 2.579
  [4,16,-4.508,0,2.634,-4.664,0,-2.063,-4.626,0,-2.013,-4.451,0,2.579],
// 3 16 -4.569 0 -2 -1.592 0 -1.055 -1.644 0 -0.993
  [3,16,-4.569,0,-2,-1.592,0,-1.055,-1.644,0,-0.993],
// 4 16 -4.451 0 2.579 -4.626 0 -2.013 -4.569 0 -2 -4.345 0 2.56
  [4,16,-4.451,0,2.579,-4.626,0,-2.013,-4.569,0,-2,-4.345,0,2.56],
// 4 16 -4.569 0 -2 -1.644 0 -0.993 -1.657 0 -0.9 -4.345 0 2.56
  [4,16,-4.569,0,-2,-1.644,0,-0.993,-1.657,0,-0.9,-4.345,0,2.56],
// 3 16 -4.681 0 -3.451 -10 0 -10 -4.616 0 -3.905
  [3,16,-4.681,0,-3.451,-10,0,-10,-4.616,0,-3.905],
// 4 16 -10 0 10 -4.687 0 -2.167 -4.664 0 -2.063 -4.508 0 2.634
  [4,16,-10,0,10,-4.687,0,-2.167,-4.664,0,-2.063,-4.508,0,2.634],
// 3 16 -0.529 0 -7.378 -1.014 0 -7.315 -10 0 -10
  [3,16,-0.529,0,-7.378,-1.014,0,-7.315,-10,0,-10],
// 4 16 0.336 0 -2.9 -0.375 0 -2.709 -0.362 0 -2.935 0.316 0 -3.041
  [4,16,0.336,0,-2.9,-0.375,0,-2.709,-0.362,0,-2.935,0.316,0,-3.041],
// 3 16 -1.014 0 -7.315 -1.477 0 -7.211 -10 0 -10
  [3,16,-1.014,0,-7.315,-1.477,0,-7.211,-10,0,-10],
// 4 16 -0.14 0 -3.293 -0.022 0 -3.3 -0.336 0 -3.095 -0.293 0 -3.201
  [4,16,-0.14,0,-3.293,-0.022,0,-3.3,-0.336,0,-3.095,-0.293,0,-3.201],
// 3 16 -0.293 0 -3.201 -0.229 0 -3.263 -0.14 0 -3.293
  [3,16,-0.293,0,-3.201,-0.229,0,-3.263,-0.14,0,-3.293],
// 4 16 0.316 0 -3.041 -0.362 0 -2.935 -0.336 0 -3.095 0.262 0 -3.153
  [4,16,0.316,0,-3.041,-0.362,0,-2.935,-0.336,0,-3.095,0.262,0,-3.153],
// 4 16 -0.022 0 -7.4 -0.529 0 -7.378 -10 0 -10 10 0 -10
  [4,16,-0.022,0,-7.4,-0.529,0,-7.378,-10,0,-10,10,0,-10],
// 4 16 0.335 0 -2.495 -0.38 0 -2.408 -0.375 0 -2.709 0.336 0 -2.9
  [4,16,0.335,0,-2.495,-0.38,0,-2.408,-0.375,0,-2.709,0.336,0,-2.9],
// 4 16 -0.537 0 -1.86 -0.317 0 -1.13 -0.56 0 -1.12 -0.983 0 -1.119
  [4,16,-0.537,0,-1.86,-0.317,0,-1.13,-0.56,0,-1.12,-0.983,0,-1.119],
// 3 16 -1.282 0 -1.112 -1.478 0 -1.093 -0.537 0 -1.86
  [3,16,-1.282,0,-1.112,-1.478,0,-1.093,-0.537,0,-1.86],
// 3 16 -0.983 0 -1.119 -1.282 0 -1.112 -0.537 0 -1.86
  [3,16,-0.983,0,-1.119,-1.282,0,-1.112,-0.537,0,-1.86],
// 4 16 -0.537 0 -1.86 -1.478 0 -1.093 -1.592 0 -1.055 -4.569 0 -2
  [4,16,-0.537,0,-1.86,-1.478,0,-1.093,-1.592,0,-1.055,-4.569,0,-2],
// 4 16 -0.38 0 -2.02 -0.38 0 -2.408 0.329 0 -2.154 0.312 0 -1.872
  [4,16,-0.38,0,-2.02,-0.38,0,-2.408,0.329,0,-2.154,0.312,0,-1.872],
// 4 16 -0.447 0 -1.879 -0.396 0 -1.934 0.279 0 -1.643 0.224 0 -1.462
  [4,16,-0.447,0,-1.879,-0.396,0,-1.934,0.279,0,-1.643,0.224,0,-1.462],
// 4 16 -0.122 0 -1.165 -0.317 0 -1.13 -0.447 0 -1.879 0.029 0 -1.228
  [4,16,-0.122,0,-1.165,-0.317,0,-1.13,-0.447,0,-1.879,0.029,0,-1.228],
// 3 16 -0.447 0 -1.879 -0.317 0 -1.13 -0.537 0 -1.86
  [3,16,-0.447,0,-1.879,-0.317,0,-1.13,-0.537,0,-1.86],
// 4 16 -0.396 0 -1.934 -0.38 0 -2.02 0.312 0 -1.872 0.279 0 -1.643
  [4,16,-0.396,0,-1.934,-0.38,0,-2.02,0.312,0,-1.872,0.279,0,-1.643],
// 3 16 -4.508 0 2.634 -4.524 0 2.72 -10 0 10
  [3,16,-4.508,0,2.634,-4.524,0,2.72,-10,0,10],
// 3 16 -4.517 0 3.306 -4.5 0 3.637 -10 0 10
  [3,16,-4.517,0,3.306,-4.5,0,3.637,-10,0,10],
// 3 16 -4.524 0 2.998 -4.517 0 3.306 -10 0 10
  [3,16,-4.524,0,2.998,-4.517,0,3.306,-10,0,10],
// 3 16 -4.524 0 2.72 -4.524 0 2.998 -10 0 10
  [3,16,-4.524,0,2.72,-4.524,0,2.998,-10,0,10],
// 3 16 -1.657 0 1.46 -1.648 0 1.571 -4.345 0 2.56
  [3,16,-1.657,0,1.46,-1.648,0,1.571,-4.345,0,2.56],
// 3 16 -1.657 0 -0.9 -1.657 0 1.46 -4.345 0 2.56
  [3,16,-1.657,0,-0.9,-1.657,0,1.46,-4.345,0,2.56],
// 4 16 -0.627 0 2.42 -4.345 0 2.56 -1.536 0 1.704 -1.405 0 1.736
  [4,16,-0.627,0,2.42,-4.345,0,2.56,-1.536,0,1.704,-1.405,0,1.736],
// 3 16 -4.5 0 3.637 -4.466 0 3.986 -10 0 10
  [3,16,-4.5,0,3.637,-4.466,0,3.986,-10,0,10],
// 3 16 -4.41 0 4.347 -4.326 0 4.713 -10 0 10
  [3,16,-4.41,0,4.347,-4.326,0,4.713,-10,0,10],
// 3 16 -10 0 10 -4.21 0 5.08 -4.055 0 5.439
  [3,16,-10,0,10,-4.21,0,5.08,-4.055,0,5.439],
// 3 16 -4.21 0 5.08 -10 0 10 -4.326 0 4.713
  [3,16,-4.21,0,5.08,-10,0,10,-4.326,0,4.713],
// 3 16 -10 0 10 -4.055 0 5.439 -3.856 0 5.787
  [3,16,-10,0,10,-4.055,0,5.439,-3.856,0,5.787],
// 3 16 -4.41 0 4.347 -10 0 10 -4.466 0 3.986
  [3,16,-4.41,0,4.347,-10,0,10,-4.466,0,3.986],
// 3 16 -3.608 0 6.116 -3.305 0 6.42 -10 0 10
  [3,16,-3.608,0,6.116,-3.305,0,6.42,-10,0,10],
// 3 16 -3.856 0 5.787 -3.608 0 6.116 -10 0 10
  [3,16,-3.856,0,5.787,-3.608,0,6.116,-10,0,10],
// 3 16 -2.511 0 6.933 -2.01 0 7.128 -10 0 10
  [3,16,-2.511,0,6.933,-2.01,0,7.128,-10,0,10],
// 3 16 -2.941 0 6.695 -2.511 0 6.933 -10 0 10
  [3,16,-2.941,0,6.695,-2.511,0,6.933,-10,0,10],
// 3 16 -3.305 0 6.42 -2.941 0 6.695 -10 0 10
  [3,16,-3.305,0,6.42,-2.941,0,6.695,-10,0,10],
// 3 16 -10 0 10 -2.01 0 7.128 -1.431 0 7.275
  [3,16,-10,0,10,-2.01,0,7.128,-1.431,0,7.275],
// 3 16 -4.345 0 2.56 -1.648 0 1.571 -1.612 0 1.651
  [3,16,-4.345,0,2.56,-1.648,0,1.571,-1.612,0,1.651],
// 3 16 -1.208 0 1.753 -0.931 0 1.759 -0.627 0 2.42
  [3,16,-1.208,0,1.753,-0.931,0,1.759,-0.627,0,2.42],
// 3 16 -1.405 0 1.736 -1.208 0 1.753 -0.627 0 2.42
  [3,16,-1.405,0,1.736,-1.208,0,1.753,-0.627,0,2.42],
// 4 16 -0.522 0 2.437 -0.56 0 1.76 -0.341 0 1.775 -0.147 0 1.819
  [4,16,-0.522,0,2.437,-0.56,0,1.76,-0.341,0,1.775,-0.147,0,1.819],
// 4 16 -0.56 0 1.76 -0.522 0 2.437 -0.627 0 2.42 -0.931 0 1.759
  [4,16,-0.56,0,1.76,-0.522,0,2.437,-0.627,0,2.42,-0.931,0,1.759],
// 4 16 -0.445 0 2.482 -0.522 0 2.437 -0.147 0 1.819 0.019 0 1.887
  [4,16,-0.445,0,2.482,-0.522,0,2.437,-0.147,0,1.819,0.019,0,1.887],
// 4 16 -0.397 0 2.547 -0.445 0 2.482 0.315 0 2.207 0.336 0 2.34
  [4,16,-0.397,0,2.547,-0.445,0,2.482,0.315,0,2.207,0.336,0,2.34],
// 4 16 -0.38 0 2.62 -0.397 0 2.547 0.336 0 2.34 0.336 0 2.728
  [4,16,-0.38,0,2.62,-0.397,0,2.547,0.336,0,2.34,0.336,0,2.728],
// 3 16 -1.431 0 7.275 -0.771 0 7.368 -10 0 10
  [3,16,-1.431,0,7.275,-0.771,0,7.368,-10,0,10],
// 4 16 -0.372 0 3.212 -0.379 0 2.959 0.331 0 3.029 0.317 0 3.255
  [4,16,-0.372,0,3.212,-0.379,0,2.959,0.331,0,3.029,0.317,0,3.255],
// 4 16 -0.314 0 3.51 -0.352 0 3.391 -0.155 0 3.612 -0.25 0 3.579
  [4,16,-0.314,0,3.51,-0.352,0,3.391,-0.155,0,3.612,-0.25,0,3.579],
// 4 16 -0.352 0 3.391 0.292 0 3.415 -0.022 0 3.62 -0.155 0 3.612
  [4,16,-0.352,0,3.391,0.292,0,3.415,-0.022,0,3.62,-0.155,0,3.612],
// 4 16 -0.352 0 3.391 -0.372 0 3.212 0.317 0 3.255 0.292 0 3.415
  [4,16,-0.352,0,3.391,-0.372,0,3.212,0.317,0,3.255,0.292,0,3.415],
// 4 16 -0.379 0 2.959 -0.38 0 2.62 0.336 0 2.728 0.331 0 3.029
  [4,16,-0.379,0,2.959,-0.38,0,2.62,0.336,0,2.728,0.331,0,3.029],
// 3 16 -1.612 0 1.651 -1.536 0 1.704 -4.345 0 2.56
  [3,16,-1.612,0,1.651,-1.536,0,1.704,-4.345,0,2.56],
// 4 16 -10 0 10 -0.771 0 7.368 -0.022 0 7.4 10 0 10
  [4,16,-10,0,10,-0.771,0,7.368,-0.022,0,7.4,10,0,10],
// 4 16 -0.336 0 -3.095 -0.022 0 -3.3 0.182 0 -3.234 0.262 0 -3.153
  [4,16,-0.336,0,-3.095,-0.022,0,-3.3,0.182,0,-3.234,0.262,0,-3.153],
// 3 16 0.984 0 -7.313 0.492 0 -7.378 10 0 -10
  [3,16,0.984,0,-7.313,0.492,0,-7.378,10,0,-10],
// 3 16 1.452 0 -7.208 0.984 0 -7.313 10 0 -10
  [3,16,1.452,0,-7.208,0.984,0,-7.313,10,0,-10],
// 3 16 2.31 0 -6.881 1.894 0 -7.063 10 0 -10
  [3,16,2.31,0,-6.881,1.894,0,-7.063,10,0,-10],
// 3 16 2.697 0 -6.664 2.31 0 -6.881 10 0 -10
  [3,16,2.697,0,-6.664,2.31,0,-6.881,10,0,-10],
// 3 16 1.452 0 -7.208 10 0 -10 1.894 0 -7.063
  [3,16,1.452,0,-7.208,10,0,-10,1.894,0,-7.063],
// 4 16 0.143 0 -1.326 0.029 0 -1.228 -0.447 0 -1.879 0.224 0 -1.462
  [4,16,0.143,0,-1.326,0.029,0,-1.228,-0.447,0,-1.879,0.224,0,-1.462],
// 3 16 2.409 0 0.281 2.375 0 0.24 2.41 0 0.199
  [3,16,2.409,0,0.281,2.375,0,0.24,2.41,0,0.199],
// 4 16 2.409 0 0.281 2.41 0 0.199 2.511 0 0.154 2.497 0 0.332
  [4,16,2.409,0,0.281,2.41,0,0.199,2.511,0,0.154,2.497,0,0.332],
// 4 16 2.511 0 0.154 2.666 0 0.1 2.621 0 0.4 2.497 0 0.332
  [4,16,2.511,0,0.154,2.666,0,0.1,2.621,0,0.4,2.497,0,0.332],
// 3 16 0.335 0 -2.495 0.329 0 -2.154 -0.38 0 -2.408
  [3,16,0.335,0,-2.495,0.329,0,-2.154,-0.38,0,-2.408],
// 3 16 0.084 0 -3.283 0.182 0 -3.234 -0.022 0 -3.3
  [3,16,0.084,0,-3.283,0.182,0,-3.234,-0.022,0,-3.3],
// 3 16 3.38 0 -6.13 3.054 0 -6.413 10 0 -10
  [3,16,3.38,0,-6.13,3.054,0,-6.413,10,0,-10],
// 3 16 3.932 0 -5.476 3.673 0 -5.817 10 0 -10
  [3,16,3.932,0,-5.476,3.673,0,-5.817,10,0,-10],
// 3 16 4.155 0 -5.109 3.932 0 -5.476 10 0 -10
  [3,16,4.155,0,-5.109,3.932,0,-5.476,10,0,-10],
// 3 16 3.38 0 -6.13 10 0 -10 3.673 0 -5.817
  [3,16,3.38,0,-6.13,10,0,-10,3.673,0,-5.817],
// 3 16 4.341 0 -4.717 10 0 -10 4.488 0 -4.302
  [3,16,4.341,0,-4.717,10,0,-10,4.488,0,-4.302],
// 3 16 10 0 -10 4.341 0 -4.717 4.155 0 -5.109
  [3,16,10,0,-10,4.341,0,-4.717,4.155,0,-5.109],
// 3 16 4.488 0 -4.302 10 0 -10 4.595 0 -3.867
  [3,16,4.488,0,-4.302,10,0,-10,4.595,0,-3.867],
// 3 16 4.66 0 -3.412 4.595 0 -3.867 10 0 -10
  [3,16,4.66,0,-3.412,4.595,0,-3.867,10,0,-10],
// 3 16 4.682 0 -2.94 4.66 0 -3.412 10 0 -10
  [3,16,4.682,0,-2.94,4.66,0,-3.412,10,0,-10],
// 3 16 10 0 -10 4.658 0 -2.523 4.682 0 -2.94
  [3,16,10,0,-10,4.658,0,-2.523,4.682,0,-2.94],
// 3 16 3.054 0 -6.413 2.697 0 -6.664 10 0 -10
  [3,16,3.054,0,-6.413,2.697,0,-6.664,10,0,-10],
// 4 16 3.547 0 -0.413 3.767 0 -0.623 3.691 0 1.237 3.487 0 1.013
  [4,16,3.547,0,-0.413,3.767,0,-0.623,3.691,0,1.237,3.487,0,1.013],
// 4 16 3.274 0 0.817 3.095 0 -0.089 3.321 0 -0.234 3.487 0 1.013
  [4,16,3.274,0,0.817,3.095,0,-0.089,3.321,0,-0.234,3.487,0,1.013],
// 4 16 2.875 0 0.023 3.095 0 -0.089 3.056 0 0.649 2.837 0 0.51
  [4,16,2.875,0,0.023,3.095,0,-0.089,3.056,0,0.649,2.837,0,0.51],
// 3 16 3.547 0 -0.413 3.487 0 1.013 3.321 0 -0.234
  [3,16,3.547,0,-0.413,3.487,0,1.013,3.321,0,-0.234],
// 4 16 4.589 0 -2.134 4.658 0 -2.523 10 0 -10 10 0 10
  [4,16,4.589,0,-2.134,4.658,0,-2.523,10,0,-10,10,0,10],
// 4 16 4.48 0 -1.773 4.589 0 -2.134 4.422 0 2.746 4.328 0 2.394
  [4,16,4.48,0,-1.773,4.589,0,-2.134,4.422,0,2.746,4.328,0,2.394],
// 4 16 4.169 0 -1.138 4.339 0 -1.441 4.204 0 2.067 4.053 0 1.764
  [4,16,4.169,0,-1.138,4.339,0,-1.441,4.204,0,2.067,4.053,0,1.764],
// 4 16 3.976 0 -0.865 4.169 0 -1.138 4.053 0 1.764 3.881 0 1.488
  [4,16,3.976,0,-0.865,4.169,0,-1.138,4.053,0,1.764,3.881,0,1.488],
// 4 16 4.339 0 -1.441 4.48 0 -1.773 4.328 0 2.394 4.204 0 2.067
  [4,16,4.339,0,-1.441,4.48,0,-1.773,4.328,0,2.394,4.204,0,2.067],
// 4 16 3.767 0 -0.623 3.976 0 -0.865 3.881 0 1.488 3.691 0 1.237
  [4,16,3.767,0,-0.623,3.976,0,-0.865,3.881,0,1.488,3.691,0,1.237],
// 3 16 0.492 0 -7.378 -0.022 0 -7.4 10 0 -10
  [3,16,0.492,0,-7.378,-0.022,0,-7.4,10,0,-10],
// 4 16 2.666 0 0.1 2.875 0 0.023 2.837 0 0.51 2.621 0 0.4
  [4,16,2.666,0,0.1,2.875,0,0.023,2.837,0,0.51,2.621,0,0.4],
// 4 16 -0.445 0 2.482 0.153 0 1.977 0.253 0 2.085 0.315 0 2.207
  [4,16,-0.445,0,2.482,0.153,0,1.977,0.253,0,2.085,0.315,0,2.207],
// 4 16 0.096 0 3.613 0.292 0 3.415 0.249 0 3.521 0.185 0 3.583
  [4,16,0.096,0,3.613,0.292,0,3.415,0.249,0,3.521,0.185,0,3.583],
// 3 16 0.096 0 3.613 -0.022 0 3.62 0.292 0 3.415
  [3,16,0.096,0,3.613,-0.022,0,3.62,0.292,0,3.415],
// 3 16 2.209 0 6.984 2.581 0 6.805 10 0 10
  [3,16,2.209,0,6.984,2.581,0,6.805,10,0,10],
// 3 16 1.809 0 7.131 2.209 0 6.984 10 0 10
  [3,16,1.809,0,7.131,2.209,0,6.984,10,0,10],
// 3 16 0.938 0 7.332 1.385 0 7.248 10 0 10
  [3,16,0.938,0,7.332,1.385,0,7.248,10,0,10],
// 3 16 0.468 0 7.383 0.938 0 7.332 10 0 10
  [3,16,0.468,0,7.383,0.938,0,7.332,10,0,10],
// 3 16 1.809 0 7.131 10 0 10 1.385 0 7.248
  [3,16,1.809,0,7.131,10,0,10,1.385,0,7.248],
// 3 16 -0.022 0 7.4 0.468 0 7.383 10 0 10
  [3,16,-0.022,0,7.4,0.468,0,7.383,10,0,10],
// 3 16 -0.445 0 2.482 0.019 0 1.887 0.153 0 1.977
  [3,16,-0.445,0,2.482,0.019,0,1.887,0.153,0,1.977],
// 3 16 3.056 0 0.649 3.095 0 -0.089 3.274 0 0.817
  [3,16,3.056,0,0.649,3.095,0,-0.089,3.274,0,0.817],
// 4 16 10 0 10 4.482 0 3.121 4.422 0 2.746 4.589 0 -2.134
  [4,16,10,0,10,4.482,0,3.121,4.422,0,2.746,4.589,0,-2.134],
// 3 16 3.774 0 5.802 3.99 0 5.483 10 0 10
  [3,16,3.774,0,5.802,3.99,0,5.483,10,0,10],
// 3 16 3.24 0 6.36 3.523 0 6.095 10 0 10
  [3,16,3.24,0,6.36,3.523,0,6.095,10,0,10],
// 3 16 2.925 0 6.597 3.24 0 6.36 10 0 10
  [3,16,2.925,0,6.597,3.24,0,6.36,10,0,10],
// 3 16 3.774 0 5.802 10 0 10 3.523 0 6.095
  [3,16,3.774,0,5.802,10,0,10,3.523,0,6.095],
// 3 16 4.481 0 3.959 4.503 0 3.52 10 0 10
  [3,16,4.481,0,3.959,4.503,0,3.52,10,0,10],
// 3 16 4.418 0 4.376 4.481 0 3.959 10 0 10
  [3,16,4.418,0,4.376,4.481,0,3.959,10,0,10],
// 3 16 4.171 0 5.139 4.314 0 4.769 10 0 10
  [3,16,4.171,0,5.139,4.314,0,4.769,10,0,10],
// 3 16 10 0 10 4.314 0 4.769 4.418 0 4.376
  [3,16,10,0,10,4.314,0,4.769,4.418,0,4.376],
// 3 16 4.171 0 5.139 10 0 10 3.99 0 5.483
  [3,16,4.171,0,5.139,10,0,10,3.99,0,5.483],
// 3 16 4.503 0 3.52 4.482 0 3.121 10 0 10
  [3,16,4.503,0,3.52,4.482,0,3.121,10,0,10],
// 3 16 2.925 0 6.597 10 0 10 2.581 0 6.805
  [3,16,2.925,0,6.597,10,0,10,2.581,0,6.805],
// 0
];
module ldraw_lib__3070bp08(step=0, col=false, unit=2/5, alt=false, line=0.2, solid=!$preview)
    makepoly(ldraw_lib__3070bp08(), step=step, col=col, unit=unit, alt=alt, line=line, solid=solid);
ldraw_lib__3070bp08(line=0.2);
